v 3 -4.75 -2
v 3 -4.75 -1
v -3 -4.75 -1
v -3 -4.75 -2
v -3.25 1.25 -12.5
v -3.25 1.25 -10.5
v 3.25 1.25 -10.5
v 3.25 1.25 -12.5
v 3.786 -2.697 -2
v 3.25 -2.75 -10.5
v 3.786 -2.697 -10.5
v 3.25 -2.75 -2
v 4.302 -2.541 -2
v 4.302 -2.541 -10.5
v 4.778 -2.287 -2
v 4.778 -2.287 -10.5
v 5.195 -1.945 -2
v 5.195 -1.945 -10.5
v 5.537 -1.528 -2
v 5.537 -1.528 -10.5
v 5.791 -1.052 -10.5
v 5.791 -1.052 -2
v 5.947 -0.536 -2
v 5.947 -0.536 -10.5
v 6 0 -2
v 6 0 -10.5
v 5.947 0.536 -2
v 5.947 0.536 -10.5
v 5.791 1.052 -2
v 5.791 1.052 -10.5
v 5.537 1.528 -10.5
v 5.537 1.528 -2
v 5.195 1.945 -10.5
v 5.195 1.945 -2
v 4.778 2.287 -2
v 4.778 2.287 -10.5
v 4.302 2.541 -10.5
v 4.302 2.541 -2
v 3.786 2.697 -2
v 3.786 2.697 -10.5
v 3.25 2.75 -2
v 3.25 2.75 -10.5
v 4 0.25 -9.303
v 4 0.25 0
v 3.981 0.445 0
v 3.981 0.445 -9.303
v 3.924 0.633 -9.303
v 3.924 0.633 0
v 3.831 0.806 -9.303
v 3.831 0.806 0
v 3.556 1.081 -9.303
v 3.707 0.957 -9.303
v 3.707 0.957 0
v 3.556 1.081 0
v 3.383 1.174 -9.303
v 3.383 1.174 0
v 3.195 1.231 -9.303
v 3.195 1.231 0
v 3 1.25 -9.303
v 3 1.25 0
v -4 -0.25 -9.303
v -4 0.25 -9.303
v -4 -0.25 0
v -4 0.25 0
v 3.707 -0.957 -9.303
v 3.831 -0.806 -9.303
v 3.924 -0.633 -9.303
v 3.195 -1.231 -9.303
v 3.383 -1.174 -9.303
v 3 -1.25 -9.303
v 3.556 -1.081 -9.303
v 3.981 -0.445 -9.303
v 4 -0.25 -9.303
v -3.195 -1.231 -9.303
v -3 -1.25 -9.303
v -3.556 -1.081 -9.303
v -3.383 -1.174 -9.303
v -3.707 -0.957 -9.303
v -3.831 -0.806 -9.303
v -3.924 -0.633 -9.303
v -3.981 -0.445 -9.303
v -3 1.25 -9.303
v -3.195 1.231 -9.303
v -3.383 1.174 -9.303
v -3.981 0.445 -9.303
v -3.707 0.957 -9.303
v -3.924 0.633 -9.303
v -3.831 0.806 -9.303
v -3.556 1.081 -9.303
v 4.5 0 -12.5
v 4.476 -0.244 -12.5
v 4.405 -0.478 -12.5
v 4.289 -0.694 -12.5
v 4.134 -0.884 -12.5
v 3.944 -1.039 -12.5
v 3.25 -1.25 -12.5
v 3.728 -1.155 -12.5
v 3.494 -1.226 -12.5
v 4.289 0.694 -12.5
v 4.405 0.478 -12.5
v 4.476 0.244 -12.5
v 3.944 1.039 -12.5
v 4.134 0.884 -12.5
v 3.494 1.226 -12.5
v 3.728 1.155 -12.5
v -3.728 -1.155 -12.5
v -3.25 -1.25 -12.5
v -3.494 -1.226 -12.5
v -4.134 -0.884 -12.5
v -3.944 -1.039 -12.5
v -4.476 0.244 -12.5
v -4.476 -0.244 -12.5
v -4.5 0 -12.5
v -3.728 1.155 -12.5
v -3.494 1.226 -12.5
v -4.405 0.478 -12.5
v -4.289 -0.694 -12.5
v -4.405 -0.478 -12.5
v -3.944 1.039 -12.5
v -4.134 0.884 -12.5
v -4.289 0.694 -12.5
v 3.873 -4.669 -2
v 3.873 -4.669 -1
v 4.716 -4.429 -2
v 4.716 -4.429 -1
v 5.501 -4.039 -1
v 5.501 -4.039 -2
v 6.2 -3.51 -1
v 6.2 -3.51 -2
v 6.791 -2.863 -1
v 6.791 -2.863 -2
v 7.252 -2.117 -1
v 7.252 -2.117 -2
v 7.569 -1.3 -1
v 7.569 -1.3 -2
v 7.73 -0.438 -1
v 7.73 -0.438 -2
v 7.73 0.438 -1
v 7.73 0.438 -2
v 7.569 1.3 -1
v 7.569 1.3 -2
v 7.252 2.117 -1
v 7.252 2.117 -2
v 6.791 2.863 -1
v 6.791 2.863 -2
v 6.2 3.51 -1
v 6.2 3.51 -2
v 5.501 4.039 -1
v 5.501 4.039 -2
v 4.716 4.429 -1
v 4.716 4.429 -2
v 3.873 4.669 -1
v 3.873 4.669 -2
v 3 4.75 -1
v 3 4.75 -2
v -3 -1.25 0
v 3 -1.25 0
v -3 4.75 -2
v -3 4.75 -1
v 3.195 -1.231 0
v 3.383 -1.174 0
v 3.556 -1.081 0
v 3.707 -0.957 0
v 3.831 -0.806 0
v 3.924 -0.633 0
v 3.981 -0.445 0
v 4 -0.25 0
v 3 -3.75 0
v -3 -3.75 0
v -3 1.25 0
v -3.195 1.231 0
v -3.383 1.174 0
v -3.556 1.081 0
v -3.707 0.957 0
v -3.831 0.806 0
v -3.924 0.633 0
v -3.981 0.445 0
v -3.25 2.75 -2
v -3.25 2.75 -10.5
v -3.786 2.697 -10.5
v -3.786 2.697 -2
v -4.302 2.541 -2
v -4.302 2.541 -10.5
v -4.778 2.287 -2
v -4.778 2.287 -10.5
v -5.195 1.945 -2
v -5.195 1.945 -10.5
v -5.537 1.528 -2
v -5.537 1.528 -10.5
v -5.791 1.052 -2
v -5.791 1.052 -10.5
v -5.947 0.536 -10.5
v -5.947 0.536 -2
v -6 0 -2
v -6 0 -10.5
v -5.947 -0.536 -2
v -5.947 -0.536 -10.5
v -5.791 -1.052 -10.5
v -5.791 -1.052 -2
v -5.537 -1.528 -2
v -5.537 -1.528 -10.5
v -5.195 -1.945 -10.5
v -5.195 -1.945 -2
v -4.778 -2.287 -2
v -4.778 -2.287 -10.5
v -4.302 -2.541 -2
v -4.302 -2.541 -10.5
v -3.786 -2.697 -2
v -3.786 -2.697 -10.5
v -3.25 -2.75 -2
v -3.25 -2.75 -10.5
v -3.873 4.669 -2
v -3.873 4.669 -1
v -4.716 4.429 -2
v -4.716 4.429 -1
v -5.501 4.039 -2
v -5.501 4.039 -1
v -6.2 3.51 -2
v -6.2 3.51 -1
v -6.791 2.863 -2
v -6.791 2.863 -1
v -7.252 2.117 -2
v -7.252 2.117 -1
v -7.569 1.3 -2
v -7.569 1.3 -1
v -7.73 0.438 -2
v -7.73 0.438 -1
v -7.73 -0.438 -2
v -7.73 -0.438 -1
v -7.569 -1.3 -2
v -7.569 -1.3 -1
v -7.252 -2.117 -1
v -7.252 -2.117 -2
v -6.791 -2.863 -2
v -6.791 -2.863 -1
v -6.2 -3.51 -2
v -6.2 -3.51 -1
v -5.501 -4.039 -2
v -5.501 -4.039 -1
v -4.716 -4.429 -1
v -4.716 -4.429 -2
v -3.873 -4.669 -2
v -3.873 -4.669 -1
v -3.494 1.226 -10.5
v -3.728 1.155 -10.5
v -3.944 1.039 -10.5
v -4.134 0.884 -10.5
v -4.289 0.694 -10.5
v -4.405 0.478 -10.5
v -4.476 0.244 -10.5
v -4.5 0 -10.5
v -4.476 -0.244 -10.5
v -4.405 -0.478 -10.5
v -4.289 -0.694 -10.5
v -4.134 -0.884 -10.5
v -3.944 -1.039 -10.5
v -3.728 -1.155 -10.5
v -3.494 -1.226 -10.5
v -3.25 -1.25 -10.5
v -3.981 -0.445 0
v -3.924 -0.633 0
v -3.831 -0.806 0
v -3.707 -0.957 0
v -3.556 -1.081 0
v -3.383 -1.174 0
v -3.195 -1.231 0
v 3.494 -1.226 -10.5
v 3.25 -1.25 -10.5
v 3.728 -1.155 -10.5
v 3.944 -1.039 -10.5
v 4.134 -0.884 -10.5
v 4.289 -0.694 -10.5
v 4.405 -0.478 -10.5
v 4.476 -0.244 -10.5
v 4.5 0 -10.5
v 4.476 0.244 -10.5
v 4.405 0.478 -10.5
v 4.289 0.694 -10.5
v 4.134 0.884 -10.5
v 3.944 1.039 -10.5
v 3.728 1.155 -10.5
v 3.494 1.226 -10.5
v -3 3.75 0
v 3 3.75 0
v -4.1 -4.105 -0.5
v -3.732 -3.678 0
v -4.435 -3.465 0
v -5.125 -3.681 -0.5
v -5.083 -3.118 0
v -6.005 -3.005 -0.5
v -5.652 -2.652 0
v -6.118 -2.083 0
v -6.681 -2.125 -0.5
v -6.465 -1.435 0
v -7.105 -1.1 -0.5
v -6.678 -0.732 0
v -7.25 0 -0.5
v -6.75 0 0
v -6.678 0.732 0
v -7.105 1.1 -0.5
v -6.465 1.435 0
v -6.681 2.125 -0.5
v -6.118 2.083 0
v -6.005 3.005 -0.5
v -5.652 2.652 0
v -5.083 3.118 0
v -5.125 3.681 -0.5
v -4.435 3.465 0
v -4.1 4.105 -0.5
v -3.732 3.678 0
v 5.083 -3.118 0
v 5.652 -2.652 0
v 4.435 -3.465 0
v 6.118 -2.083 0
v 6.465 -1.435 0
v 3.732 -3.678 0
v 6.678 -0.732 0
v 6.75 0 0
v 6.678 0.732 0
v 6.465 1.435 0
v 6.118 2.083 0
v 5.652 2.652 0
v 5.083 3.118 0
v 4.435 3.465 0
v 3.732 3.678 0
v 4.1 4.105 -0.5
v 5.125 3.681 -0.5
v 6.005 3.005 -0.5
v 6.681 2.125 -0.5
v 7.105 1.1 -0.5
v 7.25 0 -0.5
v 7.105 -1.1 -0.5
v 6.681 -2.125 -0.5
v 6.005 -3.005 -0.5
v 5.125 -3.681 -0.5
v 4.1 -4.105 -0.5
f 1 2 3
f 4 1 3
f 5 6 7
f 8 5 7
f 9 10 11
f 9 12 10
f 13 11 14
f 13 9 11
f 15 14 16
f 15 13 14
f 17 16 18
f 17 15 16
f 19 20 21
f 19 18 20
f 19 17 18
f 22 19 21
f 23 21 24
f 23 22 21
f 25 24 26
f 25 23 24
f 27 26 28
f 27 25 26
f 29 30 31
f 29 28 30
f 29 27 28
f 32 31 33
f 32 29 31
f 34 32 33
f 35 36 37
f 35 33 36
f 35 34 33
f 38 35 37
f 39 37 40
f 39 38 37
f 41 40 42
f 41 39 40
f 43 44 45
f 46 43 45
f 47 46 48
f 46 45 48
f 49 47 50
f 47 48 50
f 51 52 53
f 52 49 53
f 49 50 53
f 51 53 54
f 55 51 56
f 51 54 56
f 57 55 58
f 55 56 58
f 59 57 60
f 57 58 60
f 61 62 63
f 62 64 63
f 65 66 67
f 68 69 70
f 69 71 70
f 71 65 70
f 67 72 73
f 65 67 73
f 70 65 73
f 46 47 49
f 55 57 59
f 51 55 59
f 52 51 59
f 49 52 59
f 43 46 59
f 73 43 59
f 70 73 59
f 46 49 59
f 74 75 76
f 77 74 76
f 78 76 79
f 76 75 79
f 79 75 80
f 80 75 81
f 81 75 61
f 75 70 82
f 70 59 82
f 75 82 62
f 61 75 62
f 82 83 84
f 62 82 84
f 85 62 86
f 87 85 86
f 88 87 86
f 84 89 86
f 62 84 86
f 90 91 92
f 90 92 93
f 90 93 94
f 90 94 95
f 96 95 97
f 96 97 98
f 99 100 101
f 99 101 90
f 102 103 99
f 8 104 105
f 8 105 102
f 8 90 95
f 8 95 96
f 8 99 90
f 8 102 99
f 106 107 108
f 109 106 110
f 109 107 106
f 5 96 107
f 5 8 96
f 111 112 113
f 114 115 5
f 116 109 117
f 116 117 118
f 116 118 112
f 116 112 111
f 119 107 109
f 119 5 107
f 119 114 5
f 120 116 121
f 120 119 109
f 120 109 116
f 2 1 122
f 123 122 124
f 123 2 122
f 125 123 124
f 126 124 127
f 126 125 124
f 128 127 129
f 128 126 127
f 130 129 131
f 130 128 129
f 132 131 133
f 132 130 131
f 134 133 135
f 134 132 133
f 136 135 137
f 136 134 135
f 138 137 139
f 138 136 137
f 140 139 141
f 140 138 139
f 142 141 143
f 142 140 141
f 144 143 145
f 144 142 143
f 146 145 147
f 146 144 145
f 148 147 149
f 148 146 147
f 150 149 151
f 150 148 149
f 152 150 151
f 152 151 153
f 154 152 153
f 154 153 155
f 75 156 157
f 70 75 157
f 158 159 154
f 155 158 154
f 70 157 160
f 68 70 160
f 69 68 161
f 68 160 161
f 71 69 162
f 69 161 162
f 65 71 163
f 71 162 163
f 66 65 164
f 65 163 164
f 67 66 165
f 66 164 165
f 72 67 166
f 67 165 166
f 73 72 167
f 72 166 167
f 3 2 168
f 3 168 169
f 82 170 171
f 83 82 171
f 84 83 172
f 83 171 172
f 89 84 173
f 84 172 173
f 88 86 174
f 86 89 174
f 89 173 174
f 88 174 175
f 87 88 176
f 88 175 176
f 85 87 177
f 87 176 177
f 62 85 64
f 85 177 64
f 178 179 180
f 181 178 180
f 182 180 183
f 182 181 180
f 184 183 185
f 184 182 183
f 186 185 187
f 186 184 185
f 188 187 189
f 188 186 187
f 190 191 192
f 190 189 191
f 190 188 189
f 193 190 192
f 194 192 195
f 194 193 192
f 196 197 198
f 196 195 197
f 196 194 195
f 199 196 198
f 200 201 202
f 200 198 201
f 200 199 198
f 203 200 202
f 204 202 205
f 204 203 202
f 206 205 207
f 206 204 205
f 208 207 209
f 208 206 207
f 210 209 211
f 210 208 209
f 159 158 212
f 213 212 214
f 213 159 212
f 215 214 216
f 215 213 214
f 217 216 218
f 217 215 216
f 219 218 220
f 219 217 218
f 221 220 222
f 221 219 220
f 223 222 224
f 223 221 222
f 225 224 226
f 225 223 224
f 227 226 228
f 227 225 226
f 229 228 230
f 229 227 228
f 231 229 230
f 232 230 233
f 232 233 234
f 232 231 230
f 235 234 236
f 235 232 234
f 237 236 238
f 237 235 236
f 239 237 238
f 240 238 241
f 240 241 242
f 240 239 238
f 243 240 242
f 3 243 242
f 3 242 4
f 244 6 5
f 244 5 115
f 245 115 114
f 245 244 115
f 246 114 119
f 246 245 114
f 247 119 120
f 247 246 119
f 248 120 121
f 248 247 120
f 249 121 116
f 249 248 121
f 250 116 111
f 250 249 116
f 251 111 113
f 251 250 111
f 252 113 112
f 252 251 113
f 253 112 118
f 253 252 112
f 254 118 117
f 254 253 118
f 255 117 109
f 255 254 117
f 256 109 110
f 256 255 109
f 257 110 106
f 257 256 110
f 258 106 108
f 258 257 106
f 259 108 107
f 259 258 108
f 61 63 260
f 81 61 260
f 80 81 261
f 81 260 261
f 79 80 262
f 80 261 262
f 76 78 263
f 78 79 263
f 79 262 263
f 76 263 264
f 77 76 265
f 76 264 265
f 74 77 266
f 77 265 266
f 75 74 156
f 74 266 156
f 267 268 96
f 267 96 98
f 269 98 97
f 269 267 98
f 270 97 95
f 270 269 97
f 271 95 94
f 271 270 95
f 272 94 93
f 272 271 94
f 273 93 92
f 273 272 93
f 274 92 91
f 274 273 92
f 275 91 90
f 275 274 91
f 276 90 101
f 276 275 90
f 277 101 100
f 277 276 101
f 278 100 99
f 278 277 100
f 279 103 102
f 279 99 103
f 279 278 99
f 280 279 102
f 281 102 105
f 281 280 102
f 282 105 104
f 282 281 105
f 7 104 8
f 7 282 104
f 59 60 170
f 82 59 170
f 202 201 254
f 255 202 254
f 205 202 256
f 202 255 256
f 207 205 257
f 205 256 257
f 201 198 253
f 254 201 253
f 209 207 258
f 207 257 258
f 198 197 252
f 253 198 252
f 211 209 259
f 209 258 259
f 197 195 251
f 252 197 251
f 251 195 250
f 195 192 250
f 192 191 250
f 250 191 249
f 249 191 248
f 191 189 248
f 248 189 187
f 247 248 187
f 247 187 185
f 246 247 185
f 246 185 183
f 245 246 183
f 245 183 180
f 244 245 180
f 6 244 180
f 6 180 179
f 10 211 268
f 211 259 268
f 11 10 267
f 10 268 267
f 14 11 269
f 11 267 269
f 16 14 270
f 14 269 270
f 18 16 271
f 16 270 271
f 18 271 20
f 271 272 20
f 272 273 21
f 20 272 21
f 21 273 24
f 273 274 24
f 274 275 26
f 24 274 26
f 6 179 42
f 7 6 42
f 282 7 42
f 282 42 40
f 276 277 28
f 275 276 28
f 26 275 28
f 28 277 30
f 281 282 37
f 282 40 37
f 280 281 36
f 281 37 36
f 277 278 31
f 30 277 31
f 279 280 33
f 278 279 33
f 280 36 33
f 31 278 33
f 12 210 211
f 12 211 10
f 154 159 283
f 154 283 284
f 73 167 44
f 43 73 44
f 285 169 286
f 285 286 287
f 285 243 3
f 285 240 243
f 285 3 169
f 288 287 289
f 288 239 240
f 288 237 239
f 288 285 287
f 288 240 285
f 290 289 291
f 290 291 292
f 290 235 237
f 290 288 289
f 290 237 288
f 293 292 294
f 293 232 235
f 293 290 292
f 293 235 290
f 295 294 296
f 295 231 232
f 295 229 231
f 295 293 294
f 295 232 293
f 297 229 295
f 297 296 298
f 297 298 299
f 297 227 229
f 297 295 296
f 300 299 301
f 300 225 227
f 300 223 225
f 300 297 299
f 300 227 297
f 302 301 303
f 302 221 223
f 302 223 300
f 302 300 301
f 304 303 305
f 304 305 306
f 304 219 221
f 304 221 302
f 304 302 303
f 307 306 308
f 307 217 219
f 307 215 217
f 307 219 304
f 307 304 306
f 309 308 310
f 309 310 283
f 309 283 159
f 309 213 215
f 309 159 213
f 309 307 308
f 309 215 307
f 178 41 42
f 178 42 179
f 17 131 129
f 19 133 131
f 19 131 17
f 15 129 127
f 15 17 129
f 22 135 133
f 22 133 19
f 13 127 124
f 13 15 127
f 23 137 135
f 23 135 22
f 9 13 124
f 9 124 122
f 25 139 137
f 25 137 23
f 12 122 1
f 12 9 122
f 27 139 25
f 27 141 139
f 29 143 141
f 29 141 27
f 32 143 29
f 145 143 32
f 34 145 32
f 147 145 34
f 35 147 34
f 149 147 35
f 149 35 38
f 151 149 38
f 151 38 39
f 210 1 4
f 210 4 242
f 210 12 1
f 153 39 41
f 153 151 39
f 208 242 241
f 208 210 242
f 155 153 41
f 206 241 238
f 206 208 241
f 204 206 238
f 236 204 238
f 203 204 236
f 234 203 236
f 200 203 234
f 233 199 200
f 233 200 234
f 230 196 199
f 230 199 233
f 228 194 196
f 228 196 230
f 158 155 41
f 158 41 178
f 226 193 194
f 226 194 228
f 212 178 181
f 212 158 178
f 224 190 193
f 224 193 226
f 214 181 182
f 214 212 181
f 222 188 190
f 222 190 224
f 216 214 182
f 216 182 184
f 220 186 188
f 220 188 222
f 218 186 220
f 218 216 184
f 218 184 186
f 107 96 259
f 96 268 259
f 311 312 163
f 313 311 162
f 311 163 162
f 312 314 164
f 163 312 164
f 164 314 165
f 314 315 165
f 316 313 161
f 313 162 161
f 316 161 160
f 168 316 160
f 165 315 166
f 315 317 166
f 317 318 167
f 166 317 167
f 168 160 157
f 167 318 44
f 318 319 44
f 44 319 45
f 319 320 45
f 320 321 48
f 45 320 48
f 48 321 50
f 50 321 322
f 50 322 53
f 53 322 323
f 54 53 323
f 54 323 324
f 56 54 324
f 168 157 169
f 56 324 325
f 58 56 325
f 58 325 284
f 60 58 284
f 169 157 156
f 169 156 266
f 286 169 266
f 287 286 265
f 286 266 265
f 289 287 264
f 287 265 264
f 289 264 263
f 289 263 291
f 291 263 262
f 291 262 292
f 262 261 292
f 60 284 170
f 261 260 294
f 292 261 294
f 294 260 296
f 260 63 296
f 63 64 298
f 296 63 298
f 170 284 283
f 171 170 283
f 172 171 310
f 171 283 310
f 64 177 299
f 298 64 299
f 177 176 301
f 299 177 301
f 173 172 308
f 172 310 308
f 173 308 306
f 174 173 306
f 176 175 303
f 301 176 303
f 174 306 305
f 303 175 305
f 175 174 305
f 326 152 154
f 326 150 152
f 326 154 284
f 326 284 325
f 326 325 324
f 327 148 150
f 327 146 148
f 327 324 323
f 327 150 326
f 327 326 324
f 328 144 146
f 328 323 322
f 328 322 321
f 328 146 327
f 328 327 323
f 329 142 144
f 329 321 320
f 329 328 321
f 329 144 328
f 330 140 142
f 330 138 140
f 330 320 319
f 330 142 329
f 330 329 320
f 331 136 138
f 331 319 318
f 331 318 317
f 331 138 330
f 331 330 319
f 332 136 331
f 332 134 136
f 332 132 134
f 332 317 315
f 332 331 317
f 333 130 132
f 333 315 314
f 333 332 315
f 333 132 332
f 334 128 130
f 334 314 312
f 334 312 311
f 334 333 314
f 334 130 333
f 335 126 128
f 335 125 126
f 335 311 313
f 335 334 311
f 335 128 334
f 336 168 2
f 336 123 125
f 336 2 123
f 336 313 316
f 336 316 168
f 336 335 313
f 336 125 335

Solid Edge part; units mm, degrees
sketch "Sketch1" plane through (0, 0, 0) normal (0, 0, 1) x (1, 0, 0)
  line L0 (3, -4.75) -> (-3, -4.75)
  arc A0 (-3, 4.75) -> (-3, -4.75) centre (-3, 0) ccw
  line L1 (-3, 4.75) -> (3, 4.75)
  arc A1 (3, -4.75) -> (3, 4.75) centre (3, 0) ccw
extrude "Protrusion1" add sketch "Sketch1" against normal blind 2
sketch "Sketch2" plane through (0, 0, -2) normal (0, 0, -1) x (1, 0, 0)
  line L0 (-3.25, 2.75) -> (3.25, 2.75)
  arc A0 (3.25, -2.75) -> (3.25, 2.75) centre (3.25, 0) ccw
  line L1 (3.25, -2.75) -> (-3.25, -2.75)
  arc A1 (-3.25, 2.75) -> (-3.25, -2.75) centre (-3.25, 0) ccw
extrude "ExtrudedProtrusion_2" add sketch "Sketch2" along normal blind 8.5
sketch "Sketch3" plane through (0, 0, -10.5) normal (0, 0, -1) x (1, 0, 0)
  line L0 (-3.25, -1.25) -> (3.25, -1.25)
  arc A0 (3.25, -1.25) -> (3.25, 1.25) centre (3.25, 0) ccw
  line L1 (3.25, 1.25) -> (-3.25, 1.25)
  arc A1 (-3.25, 1.25) -> (-3.25, -1.25) centre (-3.25, 0) ccw
extrude "ExtrudedProtrusion_3" add sketch "Sketch3" along normal blind 2
sketch "Sketch4" plane through (0, 0, 0) normal (0, 0, 1) x (1, 0, 0)
  arc A0 (-3, -1.25) -> (-4, -0.25) centre (-3, -0.25) cw
  line L0 (-4, 0.25) -> (-4, -0.25)
  arc A1 (-4, 0.25) -> (-3, 1.25) centre (-3, 0.25) cw
  line L1 (3, 1.25) -> (-3, 1.25)
  arc A2 (3, 1.25) -> (4, 0.25) centre (3, 0.25) cw
  line L2 (4, -0.25) -> (4, 0.25)
  arc A3 (3, -1.25) -> (4, -0.25) centre (3, -0.25) ccw
  line L3 (-3, -1.25) -> (3, -1.25)
extrude "ExtrudedCutout_1" cut sketch "Sketch4" against normal blind 9.303
chamfer "Chamfer_1" distance 1 angle 45 4 edges at (0, 4.75, 0) (7.75, 0, 0) (0, -4.75, 0) (-7.75, 0, 0)
